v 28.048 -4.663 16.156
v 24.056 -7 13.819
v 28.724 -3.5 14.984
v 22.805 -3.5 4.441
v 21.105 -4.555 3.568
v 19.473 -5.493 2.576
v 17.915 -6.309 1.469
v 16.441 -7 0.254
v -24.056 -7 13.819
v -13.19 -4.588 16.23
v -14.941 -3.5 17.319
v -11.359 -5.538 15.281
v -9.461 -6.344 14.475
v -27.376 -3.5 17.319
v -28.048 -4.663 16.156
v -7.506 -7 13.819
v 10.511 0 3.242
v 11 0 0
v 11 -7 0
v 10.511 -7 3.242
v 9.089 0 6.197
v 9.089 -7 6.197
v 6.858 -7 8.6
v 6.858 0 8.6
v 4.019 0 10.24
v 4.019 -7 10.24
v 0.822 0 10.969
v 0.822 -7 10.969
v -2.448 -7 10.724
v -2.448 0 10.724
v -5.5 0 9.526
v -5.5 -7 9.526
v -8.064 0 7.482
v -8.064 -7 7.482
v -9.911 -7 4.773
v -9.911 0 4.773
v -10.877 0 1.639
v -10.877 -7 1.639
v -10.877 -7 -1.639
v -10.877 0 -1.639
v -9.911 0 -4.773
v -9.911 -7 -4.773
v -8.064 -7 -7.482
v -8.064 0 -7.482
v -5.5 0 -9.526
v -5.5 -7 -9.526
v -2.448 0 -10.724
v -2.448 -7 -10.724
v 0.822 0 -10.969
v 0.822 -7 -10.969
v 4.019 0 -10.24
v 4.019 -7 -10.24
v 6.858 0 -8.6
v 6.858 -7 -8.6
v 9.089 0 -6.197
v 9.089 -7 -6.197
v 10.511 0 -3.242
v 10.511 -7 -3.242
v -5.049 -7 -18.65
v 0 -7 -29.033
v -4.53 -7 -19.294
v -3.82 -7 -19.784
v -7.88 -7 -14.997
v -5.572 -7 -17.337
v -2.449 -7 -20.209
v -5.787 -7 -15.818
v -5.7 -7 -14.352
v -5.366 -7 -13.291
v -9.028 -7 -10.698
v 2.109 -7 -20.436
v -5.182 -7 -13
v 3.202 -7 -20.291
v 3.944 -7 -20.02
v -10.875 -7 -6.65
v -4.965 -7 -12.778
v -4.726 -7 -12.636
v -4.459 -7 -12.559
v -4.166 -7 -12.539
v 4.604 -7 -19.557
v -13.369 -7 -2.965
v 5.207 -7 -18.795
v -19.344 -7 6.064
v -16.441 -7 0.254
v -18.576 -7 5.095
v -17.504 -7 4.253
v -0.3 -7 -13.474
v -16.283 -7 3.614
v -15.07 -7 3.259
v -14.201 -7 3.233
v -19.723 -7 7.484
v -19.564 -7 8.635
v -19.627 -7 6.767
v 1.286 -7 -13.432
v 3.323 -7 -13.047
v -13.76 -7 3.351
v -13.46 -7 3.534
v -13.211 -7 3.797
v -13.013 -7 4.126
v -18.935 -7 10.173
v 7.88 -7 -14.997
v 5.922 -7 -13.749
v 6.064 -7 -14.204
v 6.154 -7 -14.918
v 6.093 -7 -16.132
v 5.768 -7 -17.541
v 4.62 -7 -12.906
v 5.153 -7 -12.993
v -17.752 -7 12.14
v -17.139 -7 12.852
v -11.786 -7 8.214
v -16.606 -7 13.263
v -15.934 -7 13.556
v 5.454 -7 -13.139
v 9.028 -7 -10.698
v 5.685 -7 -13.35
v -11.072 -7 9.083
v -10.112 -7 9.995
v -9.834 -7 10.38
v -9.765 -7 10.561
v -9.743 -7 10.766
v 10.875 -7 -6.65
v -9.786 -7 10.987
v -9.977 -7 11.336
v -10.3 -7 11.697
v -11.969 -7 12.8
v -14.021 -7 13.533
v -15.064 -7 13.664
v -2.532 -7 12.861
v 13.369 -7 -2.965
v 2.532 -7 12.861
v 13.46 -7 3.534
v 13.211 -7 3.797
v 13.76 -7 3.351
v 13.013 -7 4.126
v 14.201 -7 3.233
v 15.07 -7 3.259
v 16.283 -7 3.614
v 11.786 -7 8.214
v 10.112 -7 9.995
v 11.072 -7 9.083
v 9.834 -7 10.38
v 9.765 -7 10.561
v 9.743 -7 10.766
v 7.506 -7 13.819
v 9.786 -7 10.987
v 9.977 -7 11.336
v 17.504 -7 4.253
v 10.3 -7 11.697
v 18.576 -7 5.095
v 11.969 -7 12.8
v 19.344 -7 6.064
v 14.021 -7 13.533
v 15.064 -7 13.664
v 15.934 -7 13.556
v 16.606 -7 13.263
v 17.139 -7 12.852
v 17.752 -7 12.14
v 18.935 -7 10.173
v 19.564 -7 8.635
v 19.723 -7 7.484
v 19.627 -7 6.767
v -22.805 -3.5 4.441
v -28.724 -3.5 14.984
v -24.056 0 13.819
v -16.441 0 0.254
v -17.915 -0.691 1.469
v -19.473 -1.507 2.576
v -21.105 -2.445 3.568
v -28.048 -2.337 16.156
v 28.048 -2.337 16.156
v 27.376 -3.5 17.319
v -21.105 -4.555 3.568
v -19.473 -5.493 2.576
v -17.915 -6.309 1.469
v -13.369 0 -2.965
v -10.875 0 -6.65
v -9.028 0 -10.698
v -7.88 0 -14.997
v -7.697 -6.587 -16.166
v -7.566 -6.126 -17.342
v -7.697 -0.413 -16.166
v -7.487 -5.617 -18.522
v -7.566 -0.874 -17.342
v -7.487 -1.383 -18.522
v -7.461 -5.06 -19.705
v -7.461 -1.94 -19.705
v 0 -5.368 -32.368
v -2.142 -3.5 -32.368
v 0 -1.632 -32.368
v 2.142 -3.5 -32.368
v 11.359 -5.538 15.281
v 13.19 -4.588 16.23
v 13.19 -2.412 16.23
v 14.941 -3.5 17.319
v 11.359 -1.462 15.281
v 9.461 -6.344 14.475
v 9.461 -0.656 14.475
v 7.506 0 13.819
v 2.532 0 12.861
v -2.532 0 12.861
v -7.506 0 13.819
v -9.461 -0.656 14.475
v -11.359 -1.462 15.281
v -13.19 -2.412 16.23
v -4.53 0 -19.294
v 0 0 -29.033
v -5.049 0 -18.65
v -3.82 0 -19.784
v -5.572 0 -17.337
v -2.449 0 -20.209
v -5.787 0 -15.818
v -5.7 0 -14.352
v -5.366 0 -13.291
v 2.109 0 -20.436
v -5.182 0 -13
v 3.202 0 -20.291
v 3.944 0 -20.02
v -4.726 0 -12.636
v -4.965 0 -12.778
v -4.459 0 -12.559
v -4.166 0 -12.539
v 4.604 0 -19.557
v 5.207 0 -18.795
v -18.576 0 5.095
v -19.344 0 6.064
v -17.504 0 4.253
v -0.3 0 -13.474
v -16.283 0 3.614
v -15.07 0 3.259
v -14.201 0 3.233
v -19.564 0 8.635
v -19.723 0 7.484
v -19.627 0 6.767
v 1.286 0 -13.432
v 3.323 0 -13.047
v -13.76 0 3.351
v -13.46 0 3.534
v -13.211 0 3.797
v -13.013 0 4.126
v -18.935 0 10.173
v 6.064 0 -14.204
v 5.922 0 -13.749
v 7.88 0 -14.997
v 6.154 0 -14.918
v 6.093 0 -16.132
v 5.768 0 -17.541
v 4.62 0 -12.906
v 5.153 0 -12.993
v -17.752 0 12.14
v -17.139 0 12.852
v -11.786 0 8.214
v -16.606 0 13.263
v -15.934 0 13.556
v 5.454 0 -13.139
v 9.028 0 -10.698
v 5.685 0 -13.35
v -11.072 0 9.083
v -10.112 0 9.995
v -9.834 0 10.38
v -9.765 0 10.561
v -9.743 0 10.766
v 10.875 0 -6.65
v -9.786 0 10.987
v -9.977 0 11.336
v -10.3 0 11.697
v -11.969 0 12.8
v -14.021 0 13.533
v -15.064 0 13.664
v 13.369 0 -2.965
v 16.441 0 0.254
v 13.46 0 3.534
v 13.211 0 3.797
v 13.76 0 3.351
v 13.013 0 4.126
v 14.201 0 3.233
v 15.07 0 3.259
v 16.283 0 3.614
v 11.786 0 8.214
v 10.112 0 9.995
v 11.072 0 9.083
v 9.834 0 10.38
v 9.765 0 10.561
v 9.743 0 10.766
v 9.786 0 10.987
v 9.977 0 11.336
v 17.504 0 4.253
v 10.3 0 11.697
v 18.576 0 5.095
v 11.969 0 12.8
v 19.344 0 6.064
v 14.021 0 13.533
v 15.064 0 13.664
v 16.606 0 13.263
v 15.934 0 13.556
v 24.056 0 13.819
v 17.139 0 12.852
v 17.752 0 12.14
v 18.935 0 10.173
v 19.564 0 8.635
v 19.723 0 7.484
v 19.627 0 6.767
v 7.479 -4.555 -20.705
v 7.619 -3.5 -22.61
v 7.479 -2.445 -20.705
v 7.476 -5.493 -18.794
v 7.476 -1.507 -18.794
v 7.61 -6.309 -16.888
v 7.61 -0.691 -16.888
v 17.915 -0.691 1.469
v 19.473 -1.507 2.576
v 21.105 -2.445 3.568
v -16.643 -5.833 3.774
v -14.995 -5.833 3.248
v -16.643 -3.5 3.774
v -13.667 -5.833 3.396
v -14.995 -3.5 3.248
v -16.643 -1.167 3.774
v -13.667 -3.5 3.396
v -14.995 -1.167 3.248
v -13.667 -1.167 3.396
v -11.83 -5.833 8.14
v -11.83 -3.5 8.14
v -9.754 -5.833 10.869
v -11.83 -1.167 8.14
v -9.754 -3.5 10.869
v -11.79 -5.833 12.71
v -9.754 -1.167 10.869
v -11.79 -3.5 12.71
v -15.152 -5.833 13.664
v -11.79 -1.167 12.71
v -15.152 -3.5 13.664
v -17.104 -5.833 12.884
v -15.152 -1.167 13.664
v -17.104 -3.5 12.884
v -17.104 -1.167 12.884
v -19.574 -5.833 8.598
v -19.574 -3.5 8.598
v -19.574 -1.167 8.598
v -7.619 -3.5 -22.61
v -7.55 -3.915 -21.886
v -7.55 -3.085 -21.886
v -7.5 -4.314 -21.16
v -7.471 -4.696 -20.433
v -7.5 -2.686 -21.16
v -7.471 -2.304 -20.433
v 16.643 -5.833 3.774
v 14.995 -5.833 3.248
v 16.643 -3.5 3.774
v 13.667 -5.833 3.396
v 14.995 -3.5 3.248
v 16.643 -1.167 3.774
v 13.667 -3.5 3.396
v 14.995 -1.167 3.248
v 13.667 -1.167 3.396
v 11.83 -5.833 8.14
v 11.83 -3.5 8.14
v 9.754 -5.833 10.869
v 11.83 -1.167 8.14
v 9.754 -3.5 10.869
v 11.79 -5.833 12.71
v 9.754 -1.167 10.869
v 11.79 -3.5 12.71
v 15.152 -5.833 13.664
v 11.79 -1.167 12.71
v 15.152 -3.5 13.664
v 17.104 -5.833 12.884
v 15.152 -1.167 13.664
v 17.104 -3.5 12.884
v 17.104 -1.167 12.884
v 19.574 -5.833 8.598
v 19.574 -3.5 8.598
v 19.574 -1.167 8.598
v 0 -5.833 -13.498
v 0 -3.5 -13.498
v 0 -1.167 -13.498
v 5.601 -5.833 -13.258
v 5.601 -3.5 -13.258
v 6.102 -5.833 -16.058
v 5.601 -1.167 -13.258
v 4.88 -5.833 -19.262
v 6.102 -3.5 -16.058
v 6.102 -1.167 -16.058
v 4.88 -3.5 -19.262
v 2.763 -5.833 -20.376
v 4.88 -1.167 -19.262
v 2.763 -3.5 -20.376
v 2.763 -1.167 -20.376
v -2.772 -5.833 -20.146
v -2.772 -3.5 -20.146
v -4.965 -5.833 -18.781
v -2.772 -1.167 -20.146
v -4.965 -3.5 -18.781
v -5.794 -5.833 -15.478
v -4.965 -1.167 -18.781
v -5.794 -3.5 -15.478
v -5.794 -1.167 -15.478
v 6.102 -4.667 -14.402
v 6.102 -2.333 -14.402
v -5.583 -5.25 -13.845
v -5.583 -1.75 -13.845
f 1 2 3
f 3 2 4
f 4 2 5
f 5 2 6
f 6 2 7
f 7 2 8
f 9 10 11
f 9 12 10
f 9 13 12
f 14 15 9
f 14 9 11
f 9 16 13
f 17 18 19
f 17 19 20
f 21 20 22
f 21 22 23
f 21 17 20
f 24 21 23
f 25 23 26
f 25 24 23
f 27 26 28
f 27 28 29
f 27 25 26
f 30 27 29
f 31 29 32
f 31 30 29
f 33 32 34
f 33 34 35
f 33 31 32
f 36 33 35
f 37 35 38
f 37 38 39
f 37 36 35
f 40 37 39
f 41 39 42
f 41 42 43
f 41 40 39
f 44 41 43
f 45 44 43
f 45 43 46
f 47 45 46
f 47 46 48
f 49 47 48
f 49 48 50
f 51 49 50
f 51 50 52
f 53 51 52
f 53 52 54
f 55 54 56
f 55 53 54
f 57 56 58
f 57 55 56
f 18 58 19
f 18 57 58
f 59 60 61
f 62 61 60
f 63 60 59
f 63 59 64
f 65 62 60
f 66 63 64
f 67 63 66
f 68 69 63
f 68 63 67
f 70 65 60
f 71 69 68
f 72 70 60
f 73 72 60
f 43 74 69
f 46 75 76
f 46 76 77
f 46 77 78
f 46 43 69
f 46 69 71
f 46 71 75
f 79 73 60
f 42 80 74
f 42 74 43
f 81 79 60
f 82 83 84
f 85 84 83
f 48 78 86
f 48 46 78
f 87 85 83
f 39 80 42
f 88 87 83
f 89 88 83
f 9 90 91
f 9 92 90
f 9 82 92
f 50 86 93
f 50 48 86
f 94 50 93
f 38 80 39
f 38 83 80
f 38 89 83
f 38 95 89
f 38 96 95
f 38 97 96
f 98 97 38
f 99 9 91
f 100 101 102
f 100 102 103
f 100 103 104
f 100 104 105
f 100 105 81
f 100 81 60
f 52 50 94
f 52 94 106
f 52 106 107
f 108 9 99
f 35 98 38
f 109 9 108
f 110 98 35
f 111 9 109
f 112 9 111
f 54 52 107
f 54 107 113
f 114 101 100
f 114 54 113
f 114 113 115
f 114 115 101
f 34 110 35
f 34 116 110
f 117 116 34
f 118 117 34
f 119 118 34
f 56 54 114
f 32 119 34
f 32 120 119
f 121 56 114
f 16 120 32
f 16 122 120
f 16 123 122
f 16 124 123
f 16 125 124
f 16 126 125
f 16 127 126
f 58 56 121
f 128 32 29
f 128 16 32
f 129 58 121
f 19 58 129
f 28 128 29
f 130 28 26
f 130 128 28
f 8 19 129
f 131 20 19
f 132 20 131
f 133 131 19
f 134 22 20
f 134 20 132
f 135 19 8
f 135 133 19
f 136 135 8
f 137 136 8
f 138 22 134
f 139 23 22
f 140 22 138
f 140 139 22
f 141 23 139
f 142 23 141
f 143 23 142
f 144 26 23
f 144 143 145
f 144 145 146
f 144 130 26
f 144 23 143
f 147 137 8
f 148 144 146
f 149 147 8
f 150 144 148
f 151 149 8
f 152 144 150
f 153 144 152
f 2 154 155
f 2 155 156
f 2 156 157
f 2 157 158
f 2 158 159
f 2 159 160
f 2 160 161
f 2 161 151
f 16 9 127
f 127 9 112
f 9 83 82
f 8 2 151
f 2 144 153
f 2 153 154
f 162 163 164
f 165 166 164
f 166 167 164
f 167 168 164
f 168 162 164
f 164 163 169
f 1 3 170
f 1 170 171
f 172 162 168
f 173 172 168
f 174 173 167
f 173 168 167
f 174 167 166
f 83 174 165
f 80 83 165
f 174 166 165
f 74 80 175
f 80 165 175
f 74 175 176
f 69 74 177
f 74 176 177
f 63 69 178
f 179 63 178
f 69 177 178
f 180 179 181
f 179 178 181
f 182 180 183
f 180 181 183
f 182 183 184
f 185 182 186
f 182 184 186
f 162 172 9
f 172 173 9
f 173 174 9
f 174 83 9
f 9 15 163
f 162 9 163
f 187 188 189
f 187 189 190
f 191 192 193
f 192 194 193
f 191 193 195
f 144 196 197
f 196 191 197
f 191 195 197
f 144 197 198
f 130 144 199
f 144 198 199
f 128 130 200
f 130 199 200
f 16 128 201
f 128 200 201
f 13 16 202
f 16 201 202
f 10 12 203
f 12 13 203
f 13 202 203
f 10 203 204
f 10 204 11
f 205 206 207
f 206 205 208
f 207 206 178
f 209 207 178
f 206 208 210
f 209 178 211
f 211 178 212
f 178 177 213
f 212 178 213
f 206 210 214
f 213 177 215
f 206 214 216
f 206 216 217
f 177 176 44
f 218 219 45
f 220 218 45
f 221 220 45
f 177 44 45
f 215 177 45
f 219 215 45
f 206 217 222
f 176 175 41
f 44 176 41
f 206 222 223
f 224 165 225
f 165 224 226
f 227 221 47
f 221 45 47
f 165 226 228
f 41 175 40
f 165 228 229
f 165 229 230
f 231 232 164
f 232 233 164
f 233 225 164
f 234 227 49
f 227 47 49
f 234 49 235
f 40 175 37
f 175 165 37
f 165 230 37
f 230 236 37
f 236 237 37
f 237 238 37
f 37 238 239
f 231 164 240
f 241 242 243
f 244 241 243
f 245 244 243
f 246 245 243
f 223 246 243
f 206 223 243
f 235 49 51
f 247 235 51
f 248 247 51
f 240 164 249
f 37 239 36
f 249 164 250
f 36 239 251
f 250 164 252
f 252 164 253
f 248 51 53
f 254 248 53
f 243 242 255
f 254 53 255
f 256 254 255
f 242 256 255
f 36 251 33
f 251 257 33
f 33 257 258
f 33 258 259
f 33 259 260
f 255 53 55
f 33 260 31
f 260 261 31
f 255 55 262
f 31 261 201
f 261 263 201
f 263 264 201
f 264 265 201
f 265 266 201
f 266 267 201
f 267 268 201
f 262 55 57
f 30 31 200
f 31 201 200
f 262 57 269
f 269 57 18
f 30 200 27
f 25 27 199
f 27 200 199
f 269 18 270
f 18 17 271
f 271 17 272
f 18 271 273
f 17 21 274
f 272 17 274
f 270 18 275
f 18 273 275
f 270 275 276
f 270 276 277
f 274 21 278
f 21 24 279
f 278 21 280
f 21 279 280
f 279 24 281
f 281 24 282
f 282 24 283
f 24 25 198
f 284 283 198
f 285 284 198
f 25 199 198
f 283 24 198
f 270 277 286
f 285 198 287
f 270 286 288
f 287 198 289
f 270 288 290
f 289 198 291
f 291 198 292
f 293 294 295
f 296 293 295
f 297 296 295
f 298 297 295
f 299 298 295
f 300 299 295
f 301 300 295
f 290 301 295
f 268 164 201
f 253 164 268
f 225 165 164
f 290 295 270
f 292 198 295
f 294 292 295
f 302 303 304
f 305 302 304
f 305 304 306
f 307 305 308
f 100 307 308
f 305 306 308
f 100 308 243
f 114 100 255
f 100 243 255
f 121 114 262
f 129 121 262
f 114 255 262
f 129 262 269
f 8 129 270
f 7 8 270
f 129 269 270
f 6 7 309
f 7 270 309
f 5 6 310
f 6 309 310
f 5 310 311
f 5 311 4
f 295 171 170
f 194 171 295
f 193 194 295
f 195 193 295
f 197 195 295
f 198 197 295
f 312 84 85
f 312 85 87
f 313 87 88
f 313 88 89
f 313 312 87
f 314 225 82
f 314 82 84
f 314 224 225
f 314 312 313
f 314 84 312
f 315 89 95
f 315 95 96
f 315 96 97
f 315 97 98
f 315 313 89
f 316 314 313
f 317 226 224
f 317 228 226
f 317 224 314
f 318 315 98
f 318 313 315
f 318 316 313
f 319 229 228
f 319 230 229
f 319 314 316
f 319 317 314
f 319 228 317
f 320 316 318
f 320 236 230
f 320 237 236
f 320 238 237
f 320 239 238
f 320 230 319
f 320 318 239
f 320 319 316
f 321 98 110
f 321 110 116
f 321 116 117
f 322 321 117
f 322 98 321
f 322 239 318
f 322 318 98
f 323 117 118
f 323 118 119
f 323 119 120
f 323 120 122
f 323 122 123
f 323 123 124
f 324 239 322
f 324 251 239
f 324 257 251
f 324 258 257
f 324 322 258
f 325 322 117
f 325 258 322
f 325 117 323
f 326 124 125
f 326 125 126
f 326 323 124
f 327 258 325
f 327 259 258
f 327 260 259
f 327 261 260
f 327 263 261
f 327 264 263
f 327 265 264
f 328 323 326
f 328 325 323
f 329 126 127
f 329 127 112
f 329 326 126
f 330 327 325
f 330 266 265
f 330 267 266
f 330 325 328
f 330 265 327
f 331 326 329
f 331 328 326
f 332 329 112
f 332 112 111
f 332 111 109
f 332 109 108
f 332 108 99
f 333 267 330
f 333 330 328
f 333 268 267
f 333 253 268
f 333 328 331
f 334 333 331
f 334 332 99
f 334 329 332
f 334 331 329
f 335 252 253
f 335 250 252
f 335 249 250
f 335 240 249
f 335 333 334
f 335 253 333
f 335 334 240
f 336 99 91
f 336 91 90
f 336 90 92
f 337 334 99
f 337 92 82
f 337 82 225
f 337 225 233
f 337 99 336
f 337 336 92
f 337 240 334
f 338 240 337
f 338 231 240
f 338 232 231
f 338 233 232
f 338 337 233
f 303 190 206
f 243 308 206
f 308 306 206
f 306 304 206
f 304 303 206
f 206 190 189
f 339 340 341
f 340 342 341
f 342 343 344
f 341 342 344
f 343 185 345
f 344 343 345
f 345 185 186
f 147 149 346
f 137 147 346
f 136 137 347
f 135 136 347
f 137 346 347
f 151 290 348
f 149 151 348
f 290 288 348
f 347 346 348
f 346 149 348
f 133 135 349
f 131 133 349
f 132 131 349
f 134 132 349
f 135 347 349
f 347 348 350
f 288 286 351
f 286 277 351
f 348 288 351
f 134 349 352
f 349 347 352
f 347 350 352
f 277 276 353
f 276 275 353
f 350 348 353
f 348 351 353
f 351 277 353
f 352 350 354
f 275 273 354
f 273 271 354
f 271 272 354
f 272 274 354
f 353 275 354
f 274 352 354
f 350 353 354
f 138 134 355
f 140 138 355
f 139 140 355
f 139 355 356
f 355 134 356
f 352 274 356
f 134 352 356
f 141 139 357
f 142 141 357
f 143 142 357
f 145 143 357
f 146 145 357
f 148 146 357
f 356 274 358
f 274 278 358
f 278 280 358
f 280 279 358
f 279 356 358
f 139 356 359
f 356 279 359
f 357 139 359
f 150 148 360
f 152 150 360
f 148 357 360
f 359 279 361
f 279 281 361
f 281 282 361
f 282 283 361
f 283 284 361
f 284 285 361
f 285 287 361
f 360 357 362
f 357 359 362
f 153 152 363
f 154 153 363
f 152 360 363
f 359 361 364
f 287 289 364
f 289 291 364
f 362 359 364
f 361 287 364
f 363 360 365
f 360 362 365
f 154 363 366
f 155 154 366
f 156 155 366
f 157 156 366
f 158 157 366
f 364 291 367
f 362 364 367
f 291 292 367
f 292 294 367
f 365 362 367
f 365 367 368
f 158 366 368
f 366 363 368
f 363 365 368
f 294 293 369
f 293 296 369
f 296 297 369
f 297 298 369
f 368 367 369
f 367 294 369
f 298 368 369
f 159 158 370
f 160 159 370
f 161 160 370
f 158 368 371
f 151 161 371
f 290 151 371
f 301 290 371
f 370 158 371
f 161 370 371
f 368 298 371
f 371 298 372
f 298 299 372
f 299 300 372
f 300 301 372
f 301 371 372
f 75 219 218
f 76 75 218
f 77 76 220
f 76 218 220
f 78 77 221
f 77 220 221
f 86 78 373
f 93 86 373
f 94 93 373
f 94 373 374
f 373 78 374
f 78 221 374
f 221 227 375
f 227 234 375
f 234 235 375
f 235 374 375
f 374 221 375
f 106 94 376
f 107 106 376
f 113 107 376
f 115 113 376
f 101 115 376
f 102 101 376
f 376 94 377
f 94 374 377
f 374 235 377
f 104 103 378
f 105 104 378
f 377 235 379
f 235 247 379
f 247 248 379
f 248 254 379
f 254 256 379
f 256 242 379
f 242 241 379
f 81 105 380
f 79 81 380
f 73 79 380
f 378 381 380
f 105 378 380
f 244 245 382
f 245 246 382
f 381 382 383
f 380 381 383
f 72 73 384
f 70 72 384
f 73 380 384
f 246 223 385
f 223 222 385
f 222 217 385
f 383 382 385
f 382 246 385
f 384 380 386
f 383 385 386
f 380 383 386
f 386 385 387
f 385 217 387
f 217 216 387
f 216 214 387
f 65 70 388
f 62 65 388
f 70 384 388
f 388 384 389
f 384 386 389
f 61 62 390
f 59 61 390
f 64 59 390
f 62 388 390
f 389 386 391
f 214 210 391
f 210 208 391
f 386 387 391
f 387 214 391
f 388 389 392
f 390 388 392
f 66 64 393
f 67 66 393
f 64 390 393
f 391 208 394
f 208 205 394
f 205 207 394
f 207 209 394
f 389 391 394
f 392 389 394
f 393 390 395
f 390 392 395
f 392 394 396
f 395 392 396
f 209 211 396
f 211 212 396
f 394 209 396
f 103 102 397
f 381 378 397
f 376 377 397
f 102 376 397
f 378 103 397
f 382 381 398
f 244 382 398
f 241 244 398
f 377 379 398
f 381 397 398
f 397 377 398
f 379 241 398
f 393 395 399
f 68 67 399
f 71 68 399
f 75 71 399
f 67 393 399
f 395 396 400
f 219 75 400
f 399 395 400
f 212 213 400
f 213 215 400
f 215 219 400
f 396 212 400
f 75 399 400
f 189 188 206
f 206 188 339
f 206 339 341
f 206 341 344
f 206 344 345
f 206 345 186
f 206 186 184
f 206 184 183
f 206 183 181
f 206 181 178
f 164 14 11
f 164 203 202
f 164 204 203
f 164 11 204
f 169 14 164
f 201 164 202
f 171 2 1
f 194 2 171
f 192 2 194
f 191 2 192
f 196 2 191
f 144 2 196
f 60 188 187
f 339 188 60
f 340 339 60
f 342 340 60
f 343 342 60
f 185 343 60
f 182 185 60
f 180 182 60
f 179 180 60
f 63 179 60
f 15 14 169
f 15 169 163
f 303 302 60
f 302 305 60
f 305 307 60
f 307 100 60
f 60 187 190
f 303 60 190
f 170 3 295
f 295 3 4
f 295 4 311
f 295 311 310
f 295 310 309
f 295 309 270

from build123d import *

# Parameters (mm, degrees)
F0_R         = 11
F1_DEPTH     = 7
F2_T1_DEPTH  = 35.2813832436
F2_T3_DEPTH  = 35.5467430765
F2_T5_DEPTH  = 34.4305362998
F2_T7_DEPTH  = 34.4305362998
F2_T9_DEPTH  = 35.2813832436
F2_T11_DEPTH = 35.5467430765


# Not quite as in the source:
# - a fillet or chamfer that OpenCascade refuses, or shapes differently, is made with other operations: its cross-section is extruded or revolved along the edge and cut away or added


with BuildPart() as f1:
    # F0 (on Front) → F1 (new body)
    with BuildSketch(Plane.XZ):
        with BuildLine():
            Line((-8.017778225, -25.1282889185), (-3.9536927291, -32.3677882552))
            Line((-3.9536927291, -32.3677882552), (3.9536927291, -32.3677882552))
            Line((3.9536927291, -32.3677882552), (8.017778225, -25.1282889185))
            ThreePointArc((8.017778225, -25.1282889185), (10.8745416094, -6.6499044579), (25.1621004057, 5.4114989824))
            Line((25.1621004057, 5.4114989824), (29.6426898708, 13.3929315811))
            Line((29.6426898708, 13.3929315811), (26.4639375252, 18.8986921484))
            Line((26.4639375252, 18.8986921484), (17.0454936065, 18.8986921484))
            ThreePointArc((17.0454936065, 18.8986921484), (0, 12.7406410493), (-17.0454936065, 18.8986921484))
            Line((-17.0454936065, 18.8986921484), (-26.4639375252, 18.8986921484))
            Line((-26.4639375252, 18.8986921484), (-29.6426898708, 13.3929315811))
            Line((-29.6426898708, 13.3929315811), (-25.1621004057, 5.4114989824))
            ThreePointArc((-25.1621004057, 5.4114989824), (-12.3306252771, -4.3414248541), (-7.4606163281, -19.7053205246))
            ThreePointArc((-7.4606163281, -19.7053205246), (-7.6002724535, -22.4310780148), (-8.017778225, -25.1282889185))
        make_face()
        Circle(F0_R, mode=Mode.SUBTRACT)
        with BuildLine():
            add(Edge.make_bspline(
                [(-19.3436696139, 6.063790572), (-18.3265059586, 4.2478718705), (-12.0994972205, 1.2345505969), (-12.9508733301, 8.6848868215), (-7.5736250413, 10.7848154742), (-15.8181364049, 15.0617341011), (-18.5131317461, 11.1739776744), (-20.2594400544, 7.6986943169), (-19.3436696139, 6.063790572)],
                knots=[0, 0, 0, 0, 0.1871980652, 0.3557946644, 0.4941971016, 0.6784835343, 0.8314622689, 1, 1, 1, 1], degree=3))
        make_face(mode=Mode.SUBTRACT)
        with BuildLine():
            add(Edge.make_bspline(
                [(-4.9653253518, -12.7779729664), (-3.9673538813, -11.990438984), (-0.0815721197, -14.8647438543), (7.1063785889, -10.9230753891), (5.7028649477, -20.847724526), (0.130602412, -20.2827447937), (-6.1063753916, -20.3844092682), (-6.0569718905, -13.6394292017), (-4.9653253518, -12.7779729664)],
                knots=[0, 0, 0, 0, 0.1595531099, 0.3282047144, 0.5033592864, 0.6613074183, 0.8254703614, 1, 1, 1, 1], degree=3))
        make_face(mode=Mode.SUBTRACT)
        with BuildLine():
            add(Edge.make_bspline(
                [(19.3436696139, 6.063790572), (18.3265059586, 4.2478718705), (12.0994972205, 1.2345505969), (12.9508733301, 8.6848868215), (7.5736250413, 10.7848154742), (15.8181364049, 15.0617341011), (18.5131317461, 11.1739776744), (20.2594400544, 7.6986943169), (19.3436696139, 6.063790572)],
                knots=[0, 0, 0, 0, 0.1871980652, 0.3557946644, 0.4941971016, 0.6784835343, 0.8314622689, 1, 1, 1, 1], degree=3))
        make_face(mode=Mode.SUBTRACT)
    extrude(amount=F1_DEPTH)

    # F2: chamfer of 5.08 on 12 edges, made by hand

    # F2_s2 → F2_t1 (cut)
    with BuildSketch(Plane(origin=(-19.2151547034, 0, 34.2286351679), x_dir=(0, 1, 0), z_dir=(0.4895169129, 0, -0.8719938027))):
        Polygon((-7, -14.2121753414), (-1.92, -19.2921753414), (-7, -19.2921753414), align=None)
        Polygon((-5.08, -19.2921753414), (0, -14.2121753414), (0, -19.2921753414), align=None)
    extrude(amount=F2_T1_DEPTH, mode=Mode.SUBTRACT)

    # F2_s4 → F2_t3 (cut)
    with BuildSketch(Plane.YZ.offset(-39.5280871041)):
        Polygon((-7, 13.8186921484), (-1.92, 18.8986921484), (-7, 18.8986921484), align=None)
        Polygon((-5.08, 18.8986921484), (0, 13.8186921484), (0, 18.8986921484), align=None)
    extrude(amount=F2_T3_DEPTH, mode=Mode.SUBTRACT)

    # F2_s6 → F2_t5 (cut)
    with BuildSketch(Plane(origin=(-19.2640867811, 0, -34.3157996098), x_dir=(0, 1, 0), z_dir=(0.4895169129, 0, 0.8719938027))):
        Polygon((-7, -14.2121753414), (-1.92, -19.2921753414), (-7, -19.2921753414), align=None)
        Polygon((-5.08, -19.2921753414), (0, -14.2121753414), (0, -19.2921753414), align=None)
    extrude(amount=F2_T5_DEPTH, mode=Mode.SUBTRACT)

    # F2_s8 → F2_t7 (cut)
    with BuildSketch(Plane(origin=(2.4097569425, 0, -4.2925853318), x_dir=(0, 1, 0), z_dir=(0.4895169129, 0, -0.8719938027))):
        Polygon((-1.92, -19.2921753414), (-7, -14.2121753414), (-7, -19.2921753414), align=None)
        Polygon((-5.08, -19.2921753414), (0, -14.2121753414), (0, -19.2921753414), align=None)
    extrude(amount=F2_T7_DEPTH, mode=Mode.SUBTRACT)

    # F2_s10 → F2_t9 (cut)
    with BuildSketch(Plane(origin=(1.9443208955, 0, 3.4634876278), x_dir=(0, 1, 0), z_dir=(0.4895169129, 0, 0.8719938027))):
        Polygon((-7, -14.2121753414), (-1.92, -19.2921753414), (-7, -19.2921753414), align=None)
        Polygon((-5.08, -19.2921753414), (0, -14.2121753414), (0, -19.2921753414), align=None)
    extrude(amount=F2_T9_DEPTH, mode=Mode.SUBTRACT)

    # F2_s12 → F2_t11 (cut)
    with BuildSketch(Plane.YZ.offset(3.9813440276)):
        Polygon((-7, 13.8186921484), (-1.92, 18.8986921484), (-7, 18.8986921484), align=None)
        Polygon((-5.08, 18.8986921484), (0, 13.8186921484), (0, 18.8986921484), align=None)
    extrude(amount=F2_T11_DEPTH, mode=Mode.SUBTRACT)


solid = f1.part
